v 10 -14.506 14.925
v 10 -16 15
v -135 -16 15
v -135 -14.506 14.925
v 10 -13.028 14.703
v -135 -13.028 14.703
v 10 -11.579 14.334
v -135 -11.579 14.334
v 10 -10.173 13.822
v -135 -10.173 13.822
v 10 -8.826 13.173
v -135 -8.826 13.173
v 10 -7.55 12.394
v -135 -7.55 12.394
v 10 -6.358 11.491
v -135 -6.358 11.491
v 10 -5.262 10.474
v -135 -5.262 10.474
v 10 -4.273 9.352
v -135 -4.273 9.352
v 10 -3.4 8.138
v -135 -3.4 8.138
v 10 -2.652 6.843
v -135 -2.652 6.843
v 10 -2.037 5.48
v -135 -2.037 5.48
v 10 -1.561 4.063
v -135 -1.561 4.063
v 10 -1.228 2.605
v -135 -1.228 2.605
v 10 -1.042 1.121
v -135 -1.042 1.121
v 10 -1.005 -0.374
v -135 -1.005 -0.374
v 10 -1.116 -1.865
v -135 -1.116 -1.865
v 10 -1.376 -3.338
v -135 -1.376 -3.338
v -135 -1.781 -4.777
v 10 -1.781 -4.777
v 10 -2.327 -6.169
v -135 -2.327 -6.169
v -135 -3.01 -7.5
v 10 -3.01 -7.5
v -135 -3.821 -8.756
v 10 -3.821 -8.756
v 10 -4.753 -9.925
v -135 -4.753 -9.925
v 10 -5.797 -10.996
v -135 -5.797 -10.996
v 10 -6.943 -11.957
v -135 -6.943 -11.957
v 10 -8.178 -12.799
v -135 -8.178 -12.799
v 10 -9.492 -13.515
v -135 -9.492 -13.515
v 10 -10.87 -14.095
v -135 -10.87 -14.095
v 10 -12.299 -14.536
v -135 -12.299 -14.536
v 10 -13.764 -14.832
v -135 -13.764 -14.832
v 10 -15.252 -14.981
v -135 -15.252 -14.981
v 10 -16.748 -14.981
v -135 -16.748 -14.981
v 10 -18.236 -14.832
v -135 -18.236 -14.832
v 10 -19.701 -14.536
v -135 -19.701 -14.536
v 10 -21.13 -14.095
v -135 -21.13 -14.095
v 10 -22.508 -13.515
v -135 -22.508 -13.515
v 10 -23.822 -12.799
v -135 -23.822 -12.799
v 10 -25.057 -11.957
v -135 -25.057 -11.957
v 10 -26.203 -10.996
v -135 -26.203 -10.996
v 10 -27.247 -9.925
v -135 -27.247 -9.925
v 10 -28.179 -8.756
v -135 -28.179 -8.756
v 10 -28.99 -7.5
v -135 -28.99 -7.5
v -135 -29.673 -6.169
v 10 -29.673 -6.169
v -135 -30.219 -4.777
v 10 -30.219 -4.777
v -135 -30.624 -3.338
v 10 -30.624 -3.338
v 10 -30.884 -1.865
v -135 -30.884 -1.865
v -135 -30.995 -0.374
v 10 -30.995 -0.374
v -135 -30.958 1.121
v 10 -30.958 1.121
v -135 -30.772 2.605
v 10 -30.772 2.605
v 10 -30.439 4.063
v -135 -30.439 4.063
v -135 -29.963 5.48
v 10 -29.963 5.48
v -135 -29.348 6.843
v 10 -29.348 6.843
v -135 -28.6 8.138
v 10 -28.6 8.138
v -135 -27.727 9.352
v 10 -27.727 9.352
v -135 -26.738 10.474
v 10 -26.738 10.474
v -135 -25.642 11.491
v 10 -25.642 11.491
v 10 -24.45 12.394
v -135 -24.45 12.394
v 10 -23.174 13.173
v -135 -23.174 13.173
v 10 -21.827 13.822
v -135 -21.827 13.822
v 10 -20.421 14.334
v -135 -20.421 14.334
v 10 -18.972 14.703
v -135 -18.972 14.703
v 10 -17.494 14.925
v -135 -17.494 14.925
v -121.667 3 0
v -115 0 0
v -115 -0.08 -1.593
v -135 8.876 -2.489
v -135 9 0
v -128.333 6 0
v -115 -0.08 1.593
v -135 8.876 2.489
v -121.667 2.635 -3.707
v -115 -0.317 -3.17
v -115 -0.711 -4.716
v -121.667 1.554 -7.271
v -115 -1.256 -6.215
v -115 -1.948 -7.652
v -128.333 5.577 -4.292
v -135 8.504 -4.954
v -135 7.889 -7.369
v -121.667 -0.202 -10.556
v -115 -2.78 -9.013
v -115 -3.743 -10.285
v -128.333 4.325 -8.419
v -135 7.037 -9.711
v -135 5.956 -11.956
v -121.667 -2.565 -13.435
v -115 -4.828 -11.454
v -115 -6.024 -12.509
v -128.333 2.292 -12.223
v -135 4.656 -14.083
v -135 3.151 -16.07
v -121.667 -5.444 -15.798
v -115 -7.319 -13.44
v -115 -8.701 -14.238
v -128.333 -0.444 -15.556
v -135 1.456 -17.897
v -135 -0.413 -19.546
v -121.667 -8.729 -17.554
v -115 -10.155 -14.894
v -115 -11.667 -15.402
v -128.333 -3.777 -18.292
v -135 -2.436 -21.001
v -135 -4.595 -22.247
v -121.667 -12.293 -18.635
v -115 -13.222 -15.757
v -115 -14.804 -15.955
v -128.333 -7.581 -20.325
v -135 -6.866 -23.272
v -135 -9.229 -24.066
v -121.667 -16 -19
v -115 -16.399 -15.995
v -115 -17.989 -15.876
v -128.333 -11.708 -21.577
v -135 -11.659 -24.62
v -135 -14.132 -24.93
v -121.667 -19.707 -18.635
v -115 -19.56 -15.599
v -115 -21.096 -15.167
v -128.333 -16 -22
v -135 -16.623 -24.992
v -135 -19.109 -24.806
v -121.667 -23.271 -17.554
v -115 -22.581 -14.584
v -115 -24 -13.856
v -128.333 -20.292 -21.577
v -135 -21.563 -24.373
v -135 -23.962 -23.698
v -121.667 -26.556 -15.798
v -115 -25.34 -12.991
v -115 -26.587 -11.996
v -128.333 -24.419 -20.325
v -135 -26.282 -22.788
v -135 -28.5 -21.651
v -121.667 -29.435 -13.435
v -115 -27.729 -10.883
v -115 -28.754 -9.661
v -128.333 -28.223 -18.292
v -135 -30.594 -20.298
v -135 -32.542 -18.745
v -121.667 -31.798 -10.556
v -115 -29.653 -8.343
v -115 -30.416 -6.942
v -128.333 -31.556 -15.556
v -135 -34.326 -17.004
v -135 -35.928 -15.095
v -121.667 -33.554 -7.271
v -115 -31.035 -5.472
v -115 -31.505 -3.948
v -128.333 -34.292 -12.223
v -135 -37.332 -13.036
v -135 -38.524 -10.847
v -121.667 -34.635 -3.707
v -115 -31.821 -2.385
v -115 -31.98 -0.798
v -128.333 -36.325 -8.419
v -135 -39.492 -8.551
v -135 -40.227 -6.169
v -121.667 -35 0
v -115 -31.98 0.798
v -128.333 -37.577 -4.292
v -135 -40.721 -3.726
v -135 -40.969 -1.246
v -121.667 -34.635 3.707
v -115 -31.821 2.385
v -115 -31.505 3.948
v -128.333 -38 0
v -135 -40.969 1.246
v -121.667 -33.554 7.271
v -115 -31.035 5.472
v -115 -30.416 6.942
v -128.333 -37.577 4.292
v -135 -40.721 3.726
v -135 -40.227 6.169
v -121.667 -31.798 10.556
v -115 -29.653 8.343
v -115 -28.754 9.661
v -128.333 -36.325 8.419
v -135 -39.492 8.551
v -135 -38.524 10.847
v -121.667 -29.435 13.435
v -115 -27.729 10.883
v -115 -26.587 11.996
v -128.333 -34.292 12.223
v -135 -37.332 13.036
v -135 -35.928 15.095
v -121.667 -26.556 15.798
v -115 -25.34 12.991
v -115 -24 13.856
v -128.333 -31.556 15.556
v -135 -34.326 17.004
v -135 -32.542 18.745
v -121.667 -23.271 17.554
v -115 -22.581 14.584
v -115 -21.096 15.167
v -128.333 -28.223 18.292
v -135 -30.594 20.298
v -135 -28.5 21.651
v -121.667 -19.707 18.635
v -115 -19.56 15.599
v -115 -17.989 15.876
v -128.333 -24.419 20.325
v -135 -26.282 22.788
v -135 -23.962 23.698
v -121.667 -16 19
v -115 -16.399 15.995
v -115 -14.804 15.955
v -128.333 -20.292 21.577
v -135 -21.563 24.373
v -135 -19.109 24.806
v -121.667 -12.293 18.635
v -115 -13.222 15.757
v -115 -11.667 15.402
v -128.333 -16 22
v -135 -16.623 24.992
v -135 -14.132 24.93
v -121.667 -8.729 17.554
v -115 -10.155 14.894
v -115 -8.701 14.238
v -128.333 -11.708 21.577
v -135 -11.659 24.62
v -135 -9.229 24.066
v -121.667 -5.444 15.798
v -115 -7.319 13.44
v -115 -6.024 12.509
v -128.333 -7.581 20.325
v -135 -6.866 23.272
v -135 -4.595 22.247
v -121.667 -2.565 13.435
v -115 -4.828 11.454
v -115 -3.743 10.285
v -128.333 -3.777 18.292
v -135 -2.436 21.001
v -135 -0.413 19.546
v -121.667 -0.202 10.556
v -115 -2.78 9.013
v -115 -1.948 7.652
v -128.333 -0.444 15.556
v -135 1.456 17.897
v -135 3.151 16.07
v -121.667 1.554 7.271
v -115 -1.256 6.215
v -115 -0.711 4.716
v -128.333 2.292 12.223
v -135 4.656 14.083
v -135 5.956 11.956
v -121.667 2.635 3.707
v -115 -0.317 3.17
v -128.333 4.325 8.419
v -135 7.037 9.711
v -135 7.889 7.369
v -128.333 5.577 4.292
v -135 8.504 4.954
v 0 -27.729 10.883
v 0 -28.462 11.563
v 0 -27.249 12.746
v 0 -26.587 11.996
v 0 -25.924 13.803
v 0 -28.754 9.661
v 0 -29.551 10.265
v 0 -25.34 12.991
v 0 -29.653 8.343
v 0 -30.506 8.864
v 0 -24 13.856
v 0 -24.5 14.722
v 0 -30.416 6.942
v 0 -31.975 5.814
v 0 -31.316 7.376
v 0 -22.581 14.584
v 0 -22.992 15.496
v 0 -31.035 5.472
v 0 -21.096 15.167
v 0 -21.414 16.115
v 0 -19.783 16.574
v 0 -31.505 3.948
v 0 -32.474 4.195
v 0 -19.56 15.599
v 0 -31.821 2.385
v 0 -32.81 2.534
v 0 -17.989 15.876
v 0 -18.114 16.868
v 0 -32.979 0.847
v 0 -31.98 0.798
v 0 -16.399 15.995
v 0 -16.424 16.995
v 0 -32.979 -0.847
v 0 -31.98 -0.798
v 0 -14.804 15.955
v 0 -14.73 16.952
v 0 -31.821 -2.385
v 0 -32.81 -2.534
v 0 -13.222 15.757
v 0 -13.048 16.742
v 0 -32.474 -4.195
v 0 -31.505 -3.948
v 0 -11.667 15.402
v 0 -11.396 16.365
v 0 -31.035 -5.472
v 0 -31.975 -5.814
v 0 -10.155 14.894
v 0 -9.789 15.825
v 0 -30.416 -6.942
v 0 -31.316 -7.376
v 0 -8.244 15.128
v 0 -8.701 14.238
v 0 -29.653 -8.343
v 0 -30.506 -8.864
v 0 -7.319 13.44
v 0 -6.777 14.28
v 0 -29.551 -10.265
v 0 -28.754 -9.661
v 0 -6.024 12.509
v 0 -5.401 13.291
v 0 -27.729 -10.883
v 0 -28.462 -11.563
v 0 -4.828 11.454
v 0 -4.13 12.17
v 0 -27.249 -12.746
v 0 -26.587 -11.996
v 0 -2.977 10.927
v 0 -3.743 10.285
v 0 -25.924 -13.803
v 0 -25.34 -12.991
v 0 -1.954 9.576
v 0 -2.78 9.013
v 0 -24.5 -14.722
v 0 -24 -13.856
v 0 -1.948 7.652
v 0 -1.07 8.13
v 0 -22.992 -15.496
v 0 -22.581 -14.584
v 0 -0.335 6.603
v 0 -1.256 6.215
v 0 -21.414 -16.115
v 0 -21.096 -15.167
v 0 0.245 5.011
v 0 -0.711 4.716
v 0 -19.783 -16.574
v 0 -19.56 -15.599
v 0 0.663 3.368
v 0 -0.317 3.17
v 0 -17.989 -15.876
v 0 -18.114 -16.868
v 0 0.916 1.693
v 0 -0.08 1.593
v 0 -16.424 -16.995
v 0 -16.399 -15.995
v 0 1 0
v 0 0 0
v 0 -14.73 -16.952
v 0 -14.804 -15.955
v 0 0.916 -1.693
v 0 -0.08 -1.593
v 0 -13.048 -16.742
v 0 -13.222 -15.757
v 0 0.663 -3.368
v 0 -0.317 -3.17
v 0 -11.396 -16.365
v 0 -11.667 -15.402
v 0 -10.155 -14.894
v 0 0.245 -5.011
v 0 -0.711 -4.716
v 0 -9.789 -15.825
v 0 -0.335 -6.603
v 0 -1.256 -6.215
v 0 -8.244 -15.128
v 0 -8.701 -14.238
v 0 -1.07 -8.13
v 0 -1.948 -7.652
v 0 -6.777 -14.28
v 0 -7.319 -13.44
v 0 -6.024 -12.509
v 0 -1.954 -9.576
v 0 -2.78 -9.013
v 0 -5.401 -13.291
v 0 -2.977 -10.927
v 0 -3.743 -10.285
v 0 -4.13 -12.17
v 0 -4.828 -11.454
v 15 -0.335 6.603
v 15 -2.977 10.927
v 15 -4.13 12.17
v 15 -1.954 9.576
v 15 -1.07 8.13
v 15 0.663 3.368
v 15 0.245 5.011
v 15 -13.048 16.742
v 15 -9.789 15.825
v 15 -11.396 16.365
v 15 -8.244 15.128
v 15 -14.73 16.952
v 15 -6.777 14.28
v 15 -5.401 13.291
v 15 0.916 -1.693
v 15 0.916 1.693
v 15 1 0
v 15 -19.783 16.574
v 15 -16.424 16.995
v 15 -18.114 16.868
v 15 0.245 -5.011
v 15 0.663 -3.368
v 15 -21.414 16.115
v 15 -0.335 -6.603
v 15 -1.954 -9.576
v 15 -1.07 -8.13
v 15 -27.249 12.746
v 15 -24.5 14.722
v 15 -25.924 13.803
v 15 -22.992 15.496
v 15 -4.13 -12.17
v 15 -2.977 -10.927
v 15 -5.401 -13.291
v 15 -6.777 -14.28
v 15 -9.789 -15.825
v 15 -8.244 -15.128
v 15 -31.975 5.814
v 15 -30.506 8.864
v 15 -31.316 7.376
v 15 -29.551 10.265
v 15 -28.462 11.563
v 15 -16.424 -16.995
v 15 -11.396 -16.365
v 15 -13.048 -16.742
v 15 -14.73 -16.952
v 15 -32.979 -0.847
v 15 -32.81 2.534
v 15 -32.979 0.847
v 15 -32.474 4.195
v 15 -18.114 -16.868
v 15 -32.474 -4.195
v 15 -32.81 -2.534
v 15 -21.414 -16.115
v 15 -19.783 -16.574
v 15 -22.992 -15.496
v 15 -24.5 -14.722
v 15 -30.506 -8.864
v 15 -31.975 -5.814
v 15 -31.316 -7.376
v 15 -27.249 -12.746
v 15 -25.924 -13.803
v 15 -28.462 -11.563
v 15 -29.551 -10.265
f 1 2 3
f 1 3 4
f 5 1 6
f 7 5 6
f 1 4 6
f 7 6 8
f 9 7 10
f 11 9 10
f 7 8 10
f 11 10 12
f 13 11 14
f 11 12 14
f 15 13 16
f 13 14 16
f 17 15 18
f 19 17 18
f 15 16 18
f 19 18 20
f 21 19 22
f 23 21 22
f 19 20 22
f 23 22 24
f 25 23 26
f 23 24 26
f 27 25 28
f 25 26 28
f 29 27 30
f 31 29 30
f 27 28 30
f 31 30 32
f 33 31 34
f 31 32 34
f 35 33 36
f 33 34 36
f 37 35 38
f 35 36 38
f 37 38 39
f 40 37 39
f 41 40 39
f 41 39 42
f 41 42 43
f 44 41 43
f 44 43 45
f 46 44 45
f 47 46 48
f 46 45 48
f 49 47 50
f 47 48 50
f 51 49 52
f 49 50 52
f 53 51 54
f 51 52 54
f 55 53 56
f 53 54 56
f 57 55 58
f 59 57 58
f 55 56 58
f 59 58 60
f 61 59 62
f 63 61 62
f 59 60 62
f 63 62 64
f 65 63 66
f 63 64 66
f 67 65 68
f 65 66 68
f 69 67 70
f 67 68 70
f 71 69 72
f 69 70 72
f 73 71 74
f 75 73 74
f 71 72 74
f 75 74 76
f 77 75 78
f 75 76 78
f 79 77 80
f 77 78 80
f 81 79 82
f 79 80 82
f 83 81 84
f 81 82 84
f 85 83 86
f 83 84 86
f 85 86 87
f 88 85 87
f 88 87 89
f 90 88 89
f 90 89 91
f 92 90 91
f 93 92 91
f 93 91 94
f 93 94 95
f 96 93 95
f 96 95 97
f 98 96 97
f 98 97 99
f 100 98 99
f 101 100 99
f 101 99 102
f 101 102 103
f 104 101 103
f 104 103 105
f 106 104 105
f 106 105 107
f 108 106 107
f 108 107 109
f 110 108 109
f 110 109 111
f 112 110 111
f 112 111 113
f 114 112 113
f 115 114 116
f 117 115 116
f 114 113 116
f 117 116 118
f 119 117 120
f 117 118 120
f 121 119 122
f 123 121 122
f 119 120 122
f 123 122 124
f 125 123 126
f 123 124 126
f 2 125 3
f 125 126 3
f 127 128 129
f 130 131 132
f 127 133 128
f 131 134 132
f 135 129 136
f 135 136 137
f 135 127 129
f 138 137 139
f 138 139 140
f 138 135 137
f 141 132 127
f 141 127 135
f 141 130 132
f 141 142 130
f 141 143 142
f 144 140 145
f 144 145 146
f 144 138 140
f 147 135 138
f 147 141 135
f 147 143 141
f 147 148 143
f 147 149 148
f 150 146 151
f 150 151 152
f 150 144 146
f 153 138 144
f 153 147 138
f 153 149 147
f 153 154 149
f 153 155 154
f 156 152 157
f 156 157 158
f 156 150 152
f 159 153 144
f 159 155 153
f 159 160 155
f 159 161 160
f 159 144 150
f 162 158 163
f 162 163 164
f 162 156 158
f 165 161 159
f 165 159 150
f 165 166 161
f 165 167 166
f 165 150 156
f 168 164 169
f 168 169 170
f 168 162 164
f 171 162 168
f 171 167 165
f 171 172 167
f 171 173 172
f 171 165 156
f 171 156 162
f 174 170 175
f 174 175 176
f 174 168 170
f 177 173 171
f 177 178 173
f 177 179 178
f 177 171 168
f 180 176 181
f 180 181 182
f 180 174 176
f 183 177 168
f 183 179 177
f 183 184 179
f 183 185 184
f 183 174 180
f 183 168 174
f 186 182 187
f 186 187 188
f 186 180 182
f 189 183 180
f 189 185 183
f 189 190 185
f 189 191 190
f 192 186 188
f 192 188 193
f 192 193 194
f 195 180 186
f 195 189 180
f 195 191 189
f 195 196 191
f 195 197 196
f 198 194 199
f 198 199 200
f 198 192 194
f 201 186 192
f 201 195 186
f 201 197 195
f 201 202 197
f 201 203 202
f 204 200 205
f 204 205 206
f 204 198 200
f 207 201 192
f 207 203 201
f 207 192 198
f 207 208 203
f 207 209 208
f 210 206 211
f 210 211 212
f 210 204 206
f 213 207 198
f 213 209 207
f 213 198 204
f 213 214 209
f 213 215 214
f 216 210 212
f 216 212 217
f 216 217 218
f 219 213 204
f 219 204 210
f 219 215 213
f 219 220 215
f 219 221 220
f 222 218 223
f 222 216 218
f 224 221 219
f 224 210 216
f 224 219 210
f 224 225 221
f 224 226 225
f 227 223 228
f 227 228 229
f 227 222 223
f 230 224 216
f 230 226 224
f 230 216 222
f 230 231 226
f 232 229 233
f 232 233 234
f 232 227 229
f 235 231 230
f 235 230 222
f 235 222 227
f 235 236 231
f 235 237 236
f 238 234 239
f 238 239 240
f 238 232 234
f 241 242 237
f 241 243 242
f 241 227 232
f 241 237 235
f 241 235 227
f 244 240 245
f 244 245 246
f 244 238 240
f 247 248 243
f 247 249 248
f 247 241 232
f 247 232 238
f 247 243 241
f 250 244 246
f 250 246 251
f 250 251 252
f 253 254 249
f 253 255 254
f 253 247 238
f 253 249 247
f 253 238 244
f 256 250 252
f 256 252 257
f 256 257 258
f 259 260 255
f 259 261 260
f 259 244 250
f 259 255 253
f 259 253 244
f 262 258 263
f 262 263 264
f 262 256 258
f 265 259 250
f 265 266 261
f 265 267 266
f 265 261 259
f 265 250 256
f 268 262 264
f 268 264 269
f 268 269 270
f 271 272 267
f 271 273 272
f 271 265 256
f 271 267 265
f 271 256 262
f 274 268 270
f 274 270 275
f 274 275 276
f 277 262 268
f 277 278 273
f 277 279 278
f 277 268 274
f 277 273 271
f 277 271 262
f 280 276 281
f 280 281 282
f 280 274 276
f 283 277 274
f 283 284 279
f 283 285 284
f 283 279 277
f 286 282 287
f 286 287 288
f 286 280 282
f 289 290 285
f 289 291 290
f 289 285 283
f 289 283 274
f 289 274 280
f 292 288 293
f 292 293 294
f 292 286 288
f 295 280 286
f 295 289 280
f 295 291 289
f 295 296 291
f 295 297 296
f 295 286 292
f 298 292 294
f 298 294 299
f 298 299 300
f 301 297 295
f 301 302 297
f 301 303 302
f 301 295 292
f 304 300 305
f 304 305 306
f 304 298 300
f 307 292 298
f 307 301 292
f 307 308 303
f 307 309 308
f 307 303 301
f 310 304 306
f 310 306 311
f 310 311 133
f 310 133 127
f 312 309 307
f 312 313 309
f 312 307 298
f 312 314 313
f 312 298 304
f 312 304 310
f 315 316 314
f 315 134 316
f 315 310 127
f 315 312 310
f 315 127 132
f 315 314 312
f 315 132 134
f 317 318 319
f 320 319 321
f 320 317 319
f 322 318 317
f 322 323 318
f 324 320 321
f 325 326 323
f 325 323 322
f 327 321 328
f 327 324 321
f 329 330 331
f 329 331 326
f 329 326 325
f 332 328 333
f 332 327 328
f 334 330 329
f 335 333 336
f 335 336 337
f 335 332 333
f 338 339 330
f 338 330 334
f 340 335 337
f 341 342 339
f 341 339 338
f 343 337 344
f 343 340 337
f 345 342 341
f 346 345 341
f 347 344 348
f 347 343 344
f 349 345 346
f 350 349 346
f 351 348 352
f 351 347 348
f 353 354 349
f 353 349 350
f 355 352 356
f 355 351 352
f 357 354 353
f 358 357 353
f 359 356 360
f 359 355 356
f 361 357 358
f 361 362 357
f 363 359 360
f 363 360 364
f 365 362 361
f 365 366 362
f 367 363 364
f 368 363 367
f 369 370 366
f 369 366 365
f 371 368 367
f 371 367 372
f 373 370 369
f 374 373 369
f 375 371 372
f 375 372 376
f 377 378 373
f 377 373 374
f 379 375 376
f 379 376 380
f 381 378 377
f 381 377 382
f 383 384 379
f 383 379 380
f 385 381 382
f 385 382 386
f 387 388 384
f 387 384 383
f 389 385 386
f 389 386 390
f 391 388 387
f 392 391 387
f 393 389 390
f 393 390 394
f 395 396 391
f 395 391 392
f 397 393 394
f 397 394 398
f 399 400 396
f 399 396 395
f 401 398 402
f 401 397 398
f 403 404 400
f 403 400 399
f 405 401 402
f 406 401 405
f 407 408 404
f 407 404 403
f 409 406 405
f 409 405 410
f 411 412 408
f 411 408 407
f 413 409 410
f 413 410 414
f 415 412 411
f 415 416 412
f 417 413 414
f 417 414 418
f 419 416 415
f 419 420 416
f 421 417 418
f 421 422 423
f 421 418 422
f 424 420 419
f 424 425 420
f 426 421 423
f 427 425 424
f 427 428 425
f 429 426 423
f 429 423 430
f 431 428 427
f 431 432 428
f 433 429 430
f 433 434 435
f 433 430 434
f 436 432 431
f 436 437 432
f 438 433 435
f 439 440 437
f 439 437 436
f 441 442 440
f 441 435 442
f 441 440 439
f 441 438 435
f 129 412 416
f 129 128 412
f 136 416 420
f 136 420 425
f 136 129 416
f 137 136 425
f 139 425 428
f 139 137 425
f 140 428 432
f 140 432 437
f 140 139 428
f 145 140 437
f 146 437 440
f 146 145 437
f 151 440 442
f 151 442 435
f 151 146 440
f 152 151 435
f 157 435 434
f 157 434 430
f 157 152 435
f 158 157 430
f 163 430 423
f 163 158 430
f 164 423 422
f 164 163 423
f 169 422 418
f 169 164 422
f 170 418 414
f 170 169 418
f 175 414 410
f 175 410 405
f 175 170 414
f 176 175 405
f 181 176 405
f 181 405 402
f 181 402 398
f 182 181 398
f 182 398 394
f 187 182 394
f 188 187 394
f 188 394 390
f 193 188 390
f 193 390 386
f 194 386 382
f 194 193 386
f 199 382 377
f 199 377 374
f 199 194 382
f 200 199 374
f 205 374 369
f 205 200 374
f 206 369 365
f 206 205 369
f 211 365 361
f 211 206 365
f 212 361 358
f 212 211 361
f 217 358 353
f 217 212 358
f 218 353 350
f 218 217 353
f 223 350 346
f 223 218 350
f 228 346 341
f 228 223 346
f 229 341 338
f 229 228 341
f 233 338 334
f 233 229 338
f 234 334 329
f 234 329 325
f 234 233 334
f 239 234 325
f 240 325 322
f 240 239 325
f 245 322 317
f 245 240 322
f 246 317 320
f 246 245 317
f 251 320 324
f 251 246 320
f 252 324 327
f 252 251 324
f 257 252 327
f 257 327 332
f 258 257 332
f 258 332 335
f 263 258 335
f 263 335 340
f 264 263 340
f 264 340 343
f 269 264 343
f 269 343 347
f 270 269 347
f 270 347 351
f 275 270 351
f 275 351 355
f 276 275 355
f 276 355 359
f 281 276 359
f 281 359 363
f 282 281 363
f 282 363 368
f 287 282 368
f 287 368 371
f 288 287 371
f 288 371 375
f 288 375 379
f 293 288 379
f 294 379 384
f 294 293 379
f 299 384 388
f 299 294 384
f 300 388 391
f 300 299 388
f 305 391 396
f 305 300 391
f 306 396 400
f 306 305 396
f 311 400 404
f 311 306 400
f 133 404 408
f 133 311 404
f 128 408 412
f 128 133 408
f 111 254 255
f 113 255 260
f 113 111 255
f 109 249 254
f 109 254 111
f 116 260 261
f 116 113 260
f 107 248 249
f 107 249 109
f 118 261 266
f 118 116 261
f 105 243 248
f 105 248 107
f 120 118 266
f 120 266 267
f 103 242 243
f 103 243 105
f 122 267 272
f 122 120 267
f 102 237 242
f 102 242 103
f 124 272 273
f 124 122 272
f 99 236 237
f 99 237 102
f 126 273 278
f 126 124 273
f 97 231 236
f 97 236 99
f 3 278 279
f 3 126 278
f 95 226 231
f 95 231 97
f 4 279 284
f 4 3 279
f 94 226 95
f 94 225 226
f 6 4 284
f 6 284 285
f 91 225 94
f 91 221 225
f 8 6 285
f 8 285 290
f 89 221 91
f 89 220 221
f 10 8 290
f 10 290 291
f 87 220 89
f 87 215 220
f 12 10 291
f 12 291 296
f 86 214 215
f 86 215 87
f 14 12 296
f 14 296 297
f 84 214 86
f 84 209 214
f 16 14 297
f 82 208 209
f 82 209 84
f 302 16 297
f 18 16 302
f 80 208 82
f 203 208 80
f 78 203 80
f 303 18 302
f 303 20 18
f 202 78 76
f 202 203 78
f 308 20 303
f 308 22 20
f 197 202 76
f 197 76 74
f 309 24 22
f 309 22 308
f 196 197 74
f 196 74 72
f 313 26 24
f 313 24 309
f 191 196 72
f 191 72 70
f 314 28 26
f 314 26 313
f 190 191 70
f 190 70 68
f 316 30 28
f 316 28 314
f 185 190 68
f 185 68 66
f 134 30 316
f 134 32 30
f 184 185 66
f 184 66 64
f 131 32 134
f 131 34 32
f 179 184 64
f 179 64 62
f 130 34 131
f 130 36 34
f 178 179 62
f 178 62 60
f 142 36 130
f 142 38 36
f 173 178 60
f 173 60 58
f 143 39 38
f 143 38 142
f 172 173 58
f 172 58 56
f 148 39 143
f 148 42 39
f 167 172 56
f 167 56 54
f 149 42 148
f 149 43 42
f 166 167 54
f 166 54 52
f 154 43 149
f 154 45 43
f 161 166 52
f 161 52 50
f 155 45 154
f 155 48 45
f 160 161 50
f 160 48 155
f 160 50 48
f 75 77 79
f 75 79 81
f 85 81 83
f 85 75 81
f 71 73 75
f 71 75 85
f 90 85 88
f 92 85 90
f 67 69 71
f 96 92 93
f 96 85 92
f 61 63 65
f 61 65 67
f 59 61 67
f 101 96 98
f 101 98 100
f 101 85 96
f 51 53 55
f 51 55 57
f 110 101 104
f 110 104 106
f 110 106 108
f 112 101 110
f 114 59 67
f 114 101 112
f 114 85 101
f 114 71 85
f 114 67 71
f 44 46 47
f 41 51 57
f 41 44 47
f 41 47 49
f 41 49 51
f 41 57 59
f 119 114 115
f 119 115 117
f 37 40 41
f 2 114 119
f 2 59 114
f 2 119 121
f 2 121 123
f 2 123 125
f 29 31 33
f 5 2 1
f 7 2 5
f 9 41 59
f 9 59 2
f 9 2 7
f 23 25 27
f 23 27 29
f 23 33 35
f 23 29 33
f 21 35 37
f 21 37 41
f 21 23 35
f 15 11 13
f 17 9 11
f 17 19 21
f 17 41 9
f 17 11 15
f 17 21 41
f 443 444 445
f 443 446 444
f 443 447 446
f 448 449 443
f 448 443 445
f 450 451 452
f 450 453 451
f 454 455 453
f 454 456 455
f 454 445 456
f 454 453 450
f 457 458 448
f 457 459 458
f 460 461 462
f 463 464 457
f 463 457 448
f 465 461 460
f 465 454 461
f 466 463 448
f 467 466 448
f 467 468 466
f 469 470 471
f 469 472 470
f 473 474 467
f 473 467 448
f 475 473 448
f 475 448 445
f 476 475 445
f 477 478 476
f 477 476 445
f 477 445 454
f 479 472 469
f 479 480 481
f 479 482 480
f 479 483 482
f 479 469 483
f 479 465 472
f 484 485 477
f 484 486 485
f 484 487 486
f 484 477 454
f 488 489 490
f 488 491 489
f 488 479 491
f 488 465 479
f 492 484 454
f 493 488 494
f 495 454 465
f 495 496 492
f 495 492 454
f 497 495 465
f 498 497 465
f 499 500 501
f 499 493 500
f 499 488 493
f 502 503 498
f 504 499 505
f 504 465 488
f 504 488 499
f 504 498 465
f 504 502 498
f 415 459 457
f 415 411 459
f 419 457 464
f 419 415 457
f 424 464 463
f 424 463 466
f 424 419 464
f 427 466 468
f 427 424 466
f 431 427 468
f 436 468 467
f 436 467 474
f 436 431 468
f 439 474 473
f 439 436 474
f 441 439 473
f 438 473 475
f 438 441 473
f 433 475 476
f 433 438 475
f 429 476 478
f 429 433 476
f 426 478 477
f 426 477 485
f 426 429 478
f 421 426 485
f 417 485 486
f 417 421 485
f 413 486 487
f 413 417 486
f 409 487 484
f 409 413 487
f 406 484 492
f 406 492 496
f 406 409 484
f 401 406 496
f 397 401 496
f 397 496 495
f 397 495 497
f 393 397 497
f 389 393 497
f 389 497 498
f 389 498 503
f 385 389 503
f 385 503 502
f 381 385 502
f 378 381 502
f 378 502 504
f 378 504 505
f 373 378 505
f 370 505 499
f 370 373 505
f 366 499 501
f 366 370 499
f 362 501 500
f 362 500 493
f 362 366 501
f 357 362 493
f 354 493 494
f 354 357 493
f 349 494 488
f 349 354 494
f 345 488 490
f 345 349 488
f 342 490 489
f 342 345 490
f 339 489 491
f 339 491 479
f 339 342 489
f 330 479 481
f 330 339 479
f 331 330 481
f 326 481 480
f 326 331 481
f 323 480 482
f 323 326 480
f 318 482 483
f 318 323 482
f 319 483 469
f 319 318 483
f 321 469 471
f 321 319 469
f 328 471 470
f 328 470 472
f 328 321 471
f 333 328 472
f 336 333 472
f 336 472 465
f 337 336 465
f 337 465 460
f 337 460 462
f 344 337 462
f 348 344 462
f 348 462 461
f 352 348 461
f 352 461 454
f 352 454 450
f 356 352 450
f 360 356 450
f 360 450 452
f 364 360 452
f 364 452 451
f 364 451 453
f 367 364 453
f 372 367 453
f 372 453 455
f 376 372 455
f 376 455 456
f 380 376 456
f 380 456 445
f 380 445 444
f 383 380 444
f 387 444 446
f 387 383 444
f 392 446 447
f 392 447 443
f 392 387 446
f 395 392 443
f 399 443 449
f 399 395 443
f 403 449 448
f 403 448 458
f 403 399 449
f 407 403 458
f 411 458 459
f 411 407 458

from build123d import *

# Parameters (mm, degrees)
SKETCH2_R          = 15
CUT_EXTRUDE1_DEPTH = 145


with BuildPart() as part:
    # Sketch1 → Revolve1 (revolve)
    with BuildSketch(Plane.XY):
        Polygon((-115, 0), (-135, 9), (-135, -16), (15, -16), (15, 1), (0, 1), (0, 0), align=None)
    revolve(axis=Axis((15, -16, 0), (-1, 0, 0)))

    # Sketch2 → Cut-Extrude1 (cut)
    with BuildSketch(Plane.ZY.offset(135)):
        with Locations((0, -16)):
            Circle(SKETCH2_R)
    extrude(amount=-CUT_EXTRUDE1_DEPTH, mode=Mode.SUBTRACT)


solid = part.part
